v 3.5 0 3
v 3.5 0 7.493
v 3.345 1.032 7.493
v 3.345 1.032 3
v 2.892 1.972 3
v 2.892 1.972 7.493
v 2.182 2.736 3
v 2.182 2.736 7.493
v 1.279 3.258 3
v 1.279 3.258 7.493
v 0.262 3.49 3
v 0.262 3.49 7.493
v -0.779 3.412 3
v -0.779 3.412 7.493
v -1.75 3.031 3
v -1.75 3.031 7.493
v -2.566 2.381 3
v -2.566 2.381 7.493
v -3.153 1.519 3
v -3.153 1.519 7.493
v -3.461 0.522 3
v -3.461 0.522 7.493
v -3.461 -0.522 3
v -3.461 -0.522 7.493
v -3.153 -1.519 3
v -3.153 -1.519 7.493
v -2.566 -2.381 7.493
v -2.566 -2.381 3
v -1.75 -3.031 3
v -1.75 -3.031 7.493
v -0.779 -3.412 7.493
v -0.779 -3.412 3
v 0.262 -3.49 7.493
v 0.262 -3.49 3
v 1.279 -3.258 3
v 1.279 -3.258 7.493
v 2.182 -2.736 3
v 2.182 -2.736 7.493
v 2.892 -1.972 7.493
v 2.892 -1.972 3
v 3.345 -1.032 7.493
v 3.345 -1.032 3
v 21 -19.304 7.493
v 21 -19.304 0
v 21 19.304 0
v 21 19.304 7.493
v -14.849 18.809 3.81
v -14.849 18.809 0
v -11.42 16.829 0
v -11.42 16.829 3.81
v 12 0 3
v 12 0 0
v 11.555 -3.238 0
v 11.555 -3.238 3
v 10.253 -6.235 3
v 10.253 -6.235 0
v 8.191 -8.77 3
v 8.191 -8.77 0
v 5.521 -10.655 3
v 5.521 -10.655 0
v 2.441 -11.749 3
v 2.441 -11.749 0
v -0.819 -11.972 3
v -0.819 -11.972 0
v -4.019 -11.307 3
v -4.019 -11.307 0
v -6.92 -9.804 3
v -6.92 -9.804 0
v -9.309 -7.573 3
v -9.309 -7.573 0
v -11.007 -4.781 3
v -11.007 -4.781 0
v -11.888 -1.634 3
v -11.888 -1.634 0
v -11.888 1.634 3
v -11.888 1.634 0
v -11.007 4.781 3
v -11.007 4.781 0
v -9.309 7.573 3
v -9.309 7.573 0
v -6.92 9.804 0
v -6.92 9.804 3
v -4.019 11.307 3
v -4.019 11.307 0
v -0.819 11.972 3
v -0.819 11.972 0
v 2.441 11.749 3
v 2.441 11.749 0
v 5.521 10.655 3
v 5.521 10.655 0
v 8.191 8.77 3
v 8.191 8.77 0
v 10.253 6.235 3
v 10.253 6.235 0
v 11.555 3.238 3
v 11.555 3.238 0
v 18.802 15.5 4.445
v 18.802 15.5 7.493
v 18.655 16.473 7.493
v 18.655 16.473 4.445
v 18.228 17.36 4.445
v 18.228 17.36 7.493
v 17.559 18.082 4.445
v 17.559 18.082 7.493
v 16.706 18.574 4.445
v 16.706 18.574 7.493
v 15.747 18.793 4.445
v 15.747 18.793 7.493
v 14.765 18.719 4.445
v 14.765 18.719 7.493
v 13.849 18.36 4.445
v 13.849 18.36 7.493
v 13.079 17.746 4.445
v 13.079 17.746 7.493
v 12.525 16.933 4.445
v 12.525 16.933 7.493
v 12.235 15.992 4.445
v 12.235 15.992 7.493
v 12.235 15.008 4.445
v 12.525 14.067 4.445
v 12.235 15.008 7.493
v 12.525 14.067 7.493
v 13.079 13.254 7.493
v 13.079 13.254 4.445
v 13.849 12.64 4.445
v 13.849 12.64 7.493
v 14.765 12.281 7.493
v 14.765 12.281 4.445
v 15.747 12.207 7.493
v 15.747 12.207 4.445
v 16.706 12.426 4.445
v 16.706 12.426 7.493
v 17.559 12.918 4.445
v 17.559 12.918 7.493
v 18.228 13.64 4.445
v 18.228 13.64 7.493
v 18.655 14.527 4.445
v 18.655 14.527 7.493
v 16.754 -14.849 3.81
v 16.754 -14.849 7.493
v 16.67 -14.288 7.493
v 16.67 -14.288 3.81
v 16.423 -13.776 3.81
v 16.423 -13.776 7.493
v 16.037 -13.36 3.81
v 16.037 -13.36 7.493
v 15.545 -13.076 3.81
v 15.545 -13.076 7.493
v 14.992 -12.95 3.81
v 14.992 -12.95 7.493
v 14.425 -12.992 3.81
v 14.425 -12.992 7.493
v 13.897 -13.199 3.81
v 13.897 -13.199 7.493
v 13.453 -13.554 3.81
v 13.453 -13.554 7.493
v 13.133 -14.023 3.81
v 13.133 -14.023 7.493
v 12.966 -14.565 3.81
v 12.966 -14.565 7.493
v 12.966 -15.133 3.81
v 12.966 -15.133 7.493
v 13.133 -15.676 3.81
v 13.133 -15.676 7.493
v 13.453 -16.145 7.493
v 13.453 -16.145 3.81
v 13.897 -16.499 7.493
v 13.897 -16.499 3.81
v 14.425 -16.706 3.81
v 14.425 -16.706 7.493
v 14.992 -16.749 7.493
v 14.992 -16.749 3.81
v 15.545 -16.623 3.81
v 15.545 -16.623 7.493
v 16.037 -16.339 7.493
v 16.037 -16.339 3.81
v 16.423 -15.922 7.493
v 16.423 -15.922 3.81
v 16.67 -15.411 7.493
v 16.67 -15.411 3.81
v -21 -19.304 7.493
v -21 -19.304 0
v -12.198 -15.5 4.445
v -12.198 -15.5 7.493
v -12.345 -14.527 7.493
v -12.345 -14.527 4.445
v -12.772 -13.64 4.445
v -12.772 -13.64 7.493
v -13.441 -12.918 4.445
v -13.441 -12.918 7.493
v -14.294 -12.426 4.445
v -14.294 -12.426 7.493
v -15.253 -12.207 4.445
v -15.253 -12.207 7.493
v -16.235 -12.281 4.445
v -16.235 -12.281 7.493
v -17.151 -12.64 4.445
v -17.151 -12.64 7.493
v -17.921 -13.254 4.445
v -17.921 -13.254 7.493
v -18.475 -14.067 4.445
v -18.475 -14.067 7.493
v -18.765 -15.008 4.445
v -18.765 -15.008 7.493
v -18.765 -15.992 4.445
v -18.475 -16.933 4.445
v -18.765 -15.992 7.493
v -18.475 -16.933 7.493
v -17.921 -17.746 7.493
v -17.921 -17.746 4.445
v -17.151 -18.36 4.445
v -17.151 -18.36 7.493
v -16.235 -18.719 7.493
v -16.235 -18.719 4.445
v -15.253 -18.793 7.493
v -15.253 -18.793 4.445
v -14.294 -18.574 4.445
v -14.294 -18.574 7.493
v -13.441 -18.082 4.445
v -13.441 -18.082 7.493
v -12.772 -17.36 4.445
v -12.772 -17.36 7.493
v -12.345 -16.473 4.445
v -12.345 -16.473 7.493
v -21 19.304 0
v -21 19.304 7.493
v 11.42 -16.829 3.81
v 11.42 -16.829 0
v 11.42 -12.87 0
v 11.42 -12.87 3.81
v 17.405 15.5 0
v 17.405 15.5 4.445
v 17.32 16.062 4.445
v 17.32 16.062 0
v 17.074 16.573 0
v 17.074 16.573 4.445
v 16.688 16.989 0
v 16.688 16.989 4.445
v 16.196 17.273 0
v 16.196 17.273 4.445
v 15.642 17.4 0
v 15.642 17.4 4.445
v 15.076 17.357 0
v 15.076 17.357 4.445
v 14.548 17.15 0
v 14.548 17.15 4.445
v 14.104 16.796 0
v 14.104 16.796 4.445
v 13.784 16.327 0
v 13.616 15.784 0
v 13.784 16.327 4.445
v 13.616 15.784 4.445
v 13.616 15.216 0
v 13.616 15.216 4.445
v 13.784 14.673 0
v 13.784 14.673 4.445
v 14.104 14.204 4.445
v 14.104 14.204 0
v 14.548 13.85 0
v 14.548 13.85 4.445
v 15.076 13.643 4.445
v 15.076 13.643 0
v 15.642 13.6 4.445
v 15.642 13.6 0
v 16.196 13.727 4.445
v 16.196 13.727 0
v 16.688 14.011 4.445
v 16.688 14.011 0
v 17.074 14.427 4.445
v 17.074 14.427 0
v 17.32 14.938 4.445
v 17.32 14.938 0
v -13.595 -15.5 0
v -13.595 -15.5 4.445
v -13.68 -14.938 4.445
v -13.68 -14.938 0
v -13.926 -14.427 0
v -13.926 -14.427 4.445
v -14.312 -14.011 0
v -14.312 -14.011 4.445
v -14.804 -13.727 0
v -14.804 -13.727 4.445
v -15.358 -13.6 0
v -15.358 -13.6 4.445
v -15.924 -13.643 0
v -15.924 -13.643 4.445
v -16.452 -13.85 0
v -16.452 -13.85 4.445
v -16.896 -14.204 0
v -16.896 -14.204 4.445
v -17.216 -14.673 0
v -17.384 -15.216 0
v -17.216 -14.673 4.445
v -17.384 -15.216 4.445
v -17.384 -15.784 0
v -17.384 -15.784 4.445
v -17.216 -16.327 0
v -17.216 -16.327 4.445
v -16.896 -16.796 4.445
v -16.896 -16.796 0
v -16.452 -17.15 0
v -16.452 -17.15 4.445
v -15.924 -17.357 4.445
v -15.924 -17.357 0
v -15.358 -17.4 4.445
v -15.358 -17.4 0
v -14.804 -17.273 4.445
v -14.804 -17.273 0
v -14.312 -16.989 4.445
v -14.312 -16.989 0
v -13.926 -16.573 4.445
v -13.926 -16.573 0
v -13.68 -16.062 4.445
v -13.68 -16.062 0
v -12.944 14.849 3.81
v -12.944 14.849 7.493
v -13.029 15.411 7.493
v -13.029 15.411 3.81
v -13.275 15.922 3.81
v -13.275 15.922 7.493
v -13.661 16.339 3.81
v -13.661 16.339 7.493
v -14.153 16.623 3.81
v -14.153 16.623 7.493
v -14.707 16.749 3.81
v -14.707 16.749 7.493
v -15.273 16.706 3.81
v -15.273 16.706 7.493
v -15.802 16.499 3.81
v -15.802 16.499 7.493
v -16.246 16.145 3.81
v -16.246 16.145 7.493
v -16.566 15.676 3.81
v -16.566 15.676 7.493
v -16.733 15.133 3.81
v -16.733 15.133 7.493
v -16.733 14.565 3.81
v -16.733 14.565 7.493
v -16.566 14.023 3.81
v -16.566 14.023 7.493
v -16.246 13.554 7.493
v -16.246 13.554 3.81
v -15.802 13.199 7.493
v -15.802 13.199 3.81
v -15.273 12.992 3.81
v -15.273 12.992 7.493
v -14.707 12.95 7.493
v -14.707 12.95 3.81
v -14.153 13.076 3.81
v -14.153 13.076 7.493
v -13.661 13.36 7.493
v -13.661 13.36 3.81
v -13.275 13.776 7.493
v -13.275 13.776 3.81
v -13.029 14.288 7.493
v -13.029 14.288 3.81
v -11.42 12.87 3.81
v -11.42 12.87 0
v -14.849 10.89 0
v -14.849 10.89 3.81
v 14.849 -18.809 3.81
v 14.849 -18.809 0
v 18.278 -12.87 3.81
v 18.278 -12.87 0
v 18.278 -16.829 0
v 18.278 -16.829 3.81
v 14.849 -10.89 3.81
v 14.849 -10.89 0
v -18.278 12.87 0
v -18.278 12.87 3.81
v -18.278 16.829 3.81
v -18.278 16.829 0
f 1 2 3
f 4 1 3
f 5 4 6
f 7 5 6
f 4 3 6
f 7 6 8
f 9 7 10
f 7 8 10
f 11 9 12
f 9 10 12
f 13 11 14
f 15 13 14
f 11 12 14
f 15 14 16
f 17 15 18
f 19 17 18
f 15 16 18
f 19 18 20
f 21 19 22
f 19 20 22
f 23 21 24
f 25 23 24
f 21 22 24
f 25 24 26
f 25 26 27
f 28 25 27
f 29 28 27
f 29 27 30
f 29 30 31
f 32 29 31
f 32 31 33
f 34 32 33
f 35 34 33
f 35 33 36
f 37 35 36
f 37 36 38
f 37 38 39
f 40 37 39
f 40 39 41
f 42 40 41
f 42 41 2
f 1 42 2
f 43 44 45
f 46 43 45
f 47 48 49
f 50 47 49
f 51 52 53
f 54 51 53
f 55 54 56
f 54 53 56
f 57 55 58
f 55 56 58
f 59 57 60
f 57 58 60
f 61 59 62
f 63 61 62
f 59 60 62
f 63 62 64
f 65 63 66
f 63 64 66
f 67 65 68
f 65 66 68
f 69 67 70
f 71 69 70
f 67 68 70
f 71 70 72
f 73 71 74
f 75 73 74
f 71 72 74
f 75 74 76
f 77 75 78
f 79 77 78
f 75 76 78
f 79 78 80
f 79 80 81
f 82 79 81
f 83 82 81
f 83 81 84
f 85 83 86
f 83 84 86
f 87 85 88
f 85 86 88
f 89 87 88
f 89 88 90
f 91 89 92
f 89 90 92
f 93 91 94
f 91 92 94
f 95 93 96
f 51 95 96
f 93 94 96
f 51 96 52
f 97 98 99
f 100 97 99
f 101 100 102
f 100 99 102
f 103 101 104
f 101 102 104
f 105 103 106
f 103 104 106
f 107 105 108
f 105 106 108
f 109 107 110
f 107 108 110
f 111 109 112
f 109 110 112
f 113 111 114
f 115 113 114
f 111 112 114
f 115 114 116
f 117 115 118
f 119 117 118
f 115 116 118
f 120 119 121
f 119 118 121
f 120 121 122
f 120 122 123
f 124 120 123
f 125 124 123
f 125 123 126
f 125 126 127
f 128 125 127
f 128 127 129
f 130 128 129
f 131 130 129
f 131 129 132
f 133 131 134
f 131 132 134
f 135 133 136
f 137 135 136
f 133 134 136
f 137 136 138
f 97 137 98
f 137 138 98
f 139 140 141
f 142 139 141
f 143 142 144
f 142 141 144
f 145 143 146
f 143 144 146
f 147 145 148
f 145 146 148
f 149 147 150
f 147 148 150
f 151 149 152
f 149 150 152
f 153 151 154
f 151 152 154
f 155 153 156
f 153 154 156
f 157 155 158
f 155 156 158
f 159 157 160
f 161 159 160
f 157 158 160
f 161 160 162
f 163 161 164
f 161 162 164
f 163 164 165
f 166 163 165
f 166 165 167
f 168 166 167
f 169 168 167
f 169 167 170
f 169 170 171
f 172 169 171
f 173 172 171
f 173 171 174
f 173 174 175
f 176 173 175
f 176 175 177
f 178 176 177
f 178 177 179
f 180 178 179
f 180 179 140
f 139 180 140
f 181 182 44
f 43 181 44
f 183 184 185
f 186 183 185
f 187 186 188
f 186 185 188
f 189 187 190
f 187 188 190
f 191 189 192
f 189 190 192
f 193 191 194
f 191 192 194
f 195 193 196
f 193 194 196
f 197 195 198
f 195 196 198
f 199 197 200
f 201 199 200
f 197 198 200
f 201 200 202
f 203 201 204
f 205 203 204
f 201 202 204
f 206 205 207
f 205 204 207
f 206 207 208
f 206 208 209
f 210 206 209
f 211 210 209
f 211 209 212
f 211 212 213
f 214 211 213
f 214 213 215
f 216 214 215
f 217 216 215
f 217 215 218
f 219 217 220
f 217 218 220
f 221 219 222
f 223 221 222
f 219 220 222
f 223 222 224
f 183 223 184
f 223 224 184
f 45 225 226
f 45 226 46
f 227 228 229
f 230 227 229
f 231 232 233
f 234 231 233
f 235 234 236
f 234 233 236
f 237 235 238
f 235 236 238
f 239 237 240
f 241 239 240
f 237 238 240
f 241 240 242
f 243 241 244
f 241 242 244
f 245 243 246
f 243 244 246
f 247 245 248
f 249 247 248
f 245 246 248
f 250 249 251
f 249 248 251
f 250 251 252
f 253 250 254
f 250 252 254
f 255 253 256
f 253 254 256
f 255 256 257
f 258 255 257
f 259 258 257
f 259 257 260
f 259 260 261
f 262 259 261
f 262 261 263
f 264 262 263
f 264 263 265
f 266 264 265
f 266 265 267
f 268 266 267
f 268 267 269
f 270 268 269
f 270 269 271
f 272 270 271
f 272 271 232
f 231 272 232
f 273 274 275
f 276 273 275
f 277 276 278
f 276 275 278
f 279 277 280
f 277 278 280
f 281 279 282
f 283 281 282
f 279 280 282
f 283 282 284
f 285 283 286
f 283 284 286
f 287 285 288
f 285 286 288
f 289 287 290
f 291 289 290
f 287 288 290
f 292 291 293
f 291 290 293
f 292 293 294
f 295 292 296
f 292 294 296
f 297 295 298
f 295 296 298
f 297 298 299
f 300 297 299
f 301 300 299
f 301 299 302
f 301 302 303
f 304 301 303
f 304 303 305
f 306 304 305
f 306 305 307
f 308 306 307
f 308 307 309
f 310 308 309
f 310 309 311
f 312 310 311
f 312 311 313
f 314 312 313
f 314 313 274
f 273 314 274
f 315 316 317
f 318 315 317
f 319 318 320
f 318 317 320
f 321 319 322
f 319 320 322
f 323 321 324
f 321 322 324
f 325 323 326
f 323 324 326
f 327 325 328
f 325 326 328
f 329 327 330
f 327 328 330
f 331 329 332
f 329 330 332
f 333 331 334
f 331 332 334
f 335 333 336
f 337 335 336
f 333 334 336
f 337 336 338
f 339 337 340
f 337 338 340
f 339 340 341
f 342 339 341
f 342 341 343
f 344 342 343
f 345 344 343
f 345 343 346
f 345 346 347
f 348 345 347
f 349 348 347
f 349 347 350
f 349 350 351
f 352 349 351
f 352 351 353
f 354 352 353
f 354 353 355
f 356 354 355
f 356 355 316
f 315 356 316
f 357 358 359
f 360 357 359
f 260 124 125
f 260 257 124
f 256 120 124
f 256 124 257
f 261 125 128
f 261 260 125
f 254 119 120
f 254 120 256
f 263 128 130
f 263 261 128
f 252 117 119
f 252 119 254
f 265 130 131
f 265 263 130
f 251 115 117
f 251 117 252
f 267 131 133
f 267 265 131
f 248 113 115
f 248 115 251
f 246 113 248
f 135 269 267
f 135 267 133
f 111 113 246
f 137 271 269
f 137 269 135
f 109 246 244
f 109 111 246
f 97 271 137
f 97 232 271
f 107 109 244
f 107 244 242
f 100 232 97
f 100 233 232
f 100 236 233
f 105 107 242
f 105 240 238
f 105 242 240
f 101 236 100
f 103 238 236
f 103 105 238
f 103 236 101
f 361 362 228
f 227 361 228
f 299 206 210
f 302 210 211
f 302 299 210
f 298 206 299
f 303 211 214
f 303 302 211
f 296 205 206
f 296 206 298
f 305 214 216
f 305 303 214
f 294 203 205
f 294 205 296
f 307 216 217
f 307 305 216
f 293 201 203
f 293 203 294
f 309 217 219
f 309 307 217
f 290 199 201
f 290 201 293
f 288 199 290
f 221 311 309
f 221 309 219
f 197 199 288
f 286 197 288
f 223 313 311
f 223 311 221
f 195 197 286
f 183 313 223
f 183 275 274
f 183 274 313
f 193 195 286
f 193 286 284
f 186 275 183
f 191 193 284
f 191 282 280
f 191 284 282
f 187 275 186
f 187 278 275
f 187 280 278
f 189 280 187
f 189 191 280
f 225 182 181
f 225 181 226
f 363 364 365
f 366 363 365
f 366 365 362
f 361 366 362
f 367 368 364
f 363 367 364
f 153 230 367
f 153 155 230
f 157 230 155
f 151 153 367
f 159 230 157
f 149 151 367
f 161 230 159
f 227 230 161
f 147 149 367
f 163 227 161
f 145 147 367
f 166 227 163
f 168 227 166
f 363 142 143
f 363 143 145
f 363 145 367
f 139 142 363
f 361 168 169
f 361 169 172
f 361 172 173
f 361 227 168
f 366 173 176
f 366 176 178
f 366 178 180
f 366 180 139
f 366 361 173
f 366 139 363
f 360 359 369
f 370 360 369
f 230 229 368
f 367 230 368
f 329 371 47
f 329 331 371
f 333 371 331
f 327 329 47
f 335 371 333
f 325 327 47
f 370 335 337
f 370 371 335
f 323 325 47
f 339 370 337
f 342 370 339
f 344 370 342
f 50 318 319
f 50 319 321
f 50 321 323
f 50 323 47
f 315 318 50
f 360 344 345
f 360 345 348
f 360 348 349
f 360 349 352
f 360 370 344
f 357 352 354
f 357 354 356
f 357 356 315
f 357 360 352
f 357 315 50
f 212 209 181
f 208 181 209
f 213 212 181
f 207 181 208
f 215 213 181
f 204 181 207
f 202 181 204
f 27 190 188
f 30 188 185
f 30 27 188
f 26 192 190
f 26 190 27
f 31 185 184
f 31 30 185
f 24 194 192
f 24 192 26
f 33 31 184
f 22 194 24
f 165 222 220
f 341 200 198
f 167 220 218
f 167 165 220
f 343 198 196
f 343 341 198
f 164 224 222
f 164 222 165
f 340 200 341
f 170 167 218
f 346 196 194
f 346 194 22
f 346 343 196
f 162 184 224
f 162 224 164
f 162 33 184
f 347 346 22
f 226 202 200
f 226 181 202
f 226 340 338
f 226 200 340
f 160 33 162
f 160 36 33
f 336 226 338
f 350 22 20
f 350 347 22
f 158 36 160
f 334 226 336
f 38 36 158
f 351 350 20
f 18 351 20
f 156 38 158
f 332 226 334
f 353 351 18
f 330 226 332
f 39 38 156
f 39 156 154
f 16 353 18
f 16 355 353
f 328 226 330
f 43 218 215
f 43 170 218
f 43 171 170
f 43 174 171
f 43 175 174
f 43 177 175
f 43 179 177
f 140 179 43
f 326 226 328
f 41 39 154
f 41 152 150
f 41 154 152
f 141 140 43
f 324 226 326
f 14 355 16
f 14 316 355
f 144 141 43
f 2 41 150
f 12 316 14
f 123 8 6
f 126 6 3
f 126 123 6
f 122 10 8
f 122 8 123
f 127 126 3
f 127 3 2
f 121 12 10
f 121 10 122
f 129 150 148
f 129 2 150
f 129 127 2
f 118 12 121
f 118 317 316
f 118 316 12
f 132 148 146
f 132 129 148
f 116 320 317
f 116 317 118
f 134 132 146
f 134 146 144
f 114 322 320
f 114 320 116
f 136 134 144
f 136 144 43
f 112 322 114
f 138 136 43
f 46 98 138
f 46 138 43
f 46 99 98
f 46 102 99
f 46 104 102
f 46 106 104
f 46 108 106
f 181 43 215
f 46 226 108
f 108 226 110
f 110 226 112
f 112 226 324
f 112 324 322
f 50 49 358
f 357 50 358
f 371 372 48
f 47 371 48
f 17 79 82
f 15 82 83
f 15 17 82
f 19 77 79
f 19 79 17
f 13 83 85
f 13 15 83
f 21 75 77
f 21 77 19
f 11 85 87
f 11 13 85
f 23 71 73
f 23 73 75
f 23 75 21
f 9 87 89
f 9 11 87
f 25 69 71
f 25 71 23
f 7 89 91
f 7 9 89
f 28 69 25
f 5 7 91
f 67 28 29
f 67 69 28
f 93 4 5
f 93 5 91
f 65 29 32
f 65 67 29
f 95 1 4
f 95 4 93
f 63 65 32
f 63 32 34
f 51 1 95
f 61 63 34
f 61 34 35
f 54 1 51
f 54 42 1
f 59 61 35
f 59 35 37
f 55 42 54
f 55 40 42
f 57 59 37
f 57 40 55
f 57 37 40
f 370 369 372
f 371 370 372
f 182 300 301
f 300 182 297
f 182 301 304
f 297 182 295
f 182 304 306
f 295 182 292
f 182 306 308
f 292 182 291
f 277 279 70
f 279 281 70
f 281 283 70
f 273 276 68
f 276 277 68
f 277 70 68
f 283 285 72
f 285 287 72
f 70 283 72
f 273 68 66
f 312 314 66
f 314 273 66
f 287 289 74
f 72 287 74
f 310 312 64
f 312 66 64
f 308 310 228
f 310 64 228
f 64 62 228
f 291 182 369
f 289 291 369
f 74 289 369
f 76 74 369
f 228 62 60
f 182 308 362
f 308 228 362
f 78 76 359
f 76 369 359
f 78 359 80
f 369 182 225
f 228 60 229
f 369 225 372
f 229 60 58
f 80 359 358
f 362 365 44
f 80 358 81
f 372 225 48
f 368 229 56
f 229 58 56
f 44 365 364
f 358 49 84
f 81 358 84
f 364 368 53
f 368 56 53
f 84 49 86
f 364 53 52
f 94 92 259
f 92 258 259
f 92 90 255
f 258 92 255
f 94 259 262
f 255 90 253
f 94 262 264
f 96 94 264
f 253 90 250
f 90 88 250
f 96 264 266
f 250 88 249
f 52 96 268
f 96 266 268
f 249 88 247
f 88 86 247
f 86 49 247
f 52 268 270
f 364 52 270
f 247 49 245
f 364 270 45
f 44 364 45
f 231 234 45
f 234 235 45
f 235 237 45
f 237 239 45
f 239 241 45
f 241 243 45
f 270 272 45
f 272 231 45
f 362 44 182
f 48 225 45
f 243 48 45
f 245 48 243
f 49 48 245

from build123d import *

# Parameters (mm, degrees)
F0_W      = 42
F0_H      = 38.608
F1_DEPTH  = 7.493
F2_R      = 1.905
F3_DEPTH  = 7.494
F4_R      = 1.905
F5_DEPTH  = 25.4
F6_R      = 3.302
F6_R_2    = 1.905
F7_DEPTH  = 3.048
F8_R      = 3.5
F9_DEPTH  = 7.494
F10_R     = 12
F11_DEPTH = 3
F13_DEPTH = 3.81


with BuildPart() as f1:
    # F0 (on Top) → F1 (new body)
    with BuildSketch(Plane.XY):
        Rectangle(F0_W, F0_H)
    extrude(amount=F1_DEPTH)

    # F2 (on face) → F3 (cut, through all)
    with BuildSketch(Plane.XY.offset(7.493)):
        with Locations((-14.8492424049, 14.8492424049)):
            Circle(F2_R)
        with Locations((14.8492424049, -14.8492424049)):
            Circle(F2_R)
    extrude(amount=-F3_DEPTH, mode=Mode.SUBTRACT)

    # F4 (on face) → F5 (cut)
    with BuildSketch(Plane.XY.offset(7.493)):
        with Locations((15.5, 15.5)):
            Circle(F4_R)
        with Locations((-15.5, -15.5)):
            Circle(F4_R)
    extrude(amount=-F5_DEPTH, mode=Mode.SUBTRACT)

    # F6 (on face) → F7 (cut)
    with BuildSketch(Plane.XY.offset(7.493)):
        with Locations((15.5, 15.5)):
            Circle(F6_R)
        with Locations((15.5, 15.5)):
            Circle(F6_R_2, mode=Mode.SUBTRACT)
        with Locations((-15.5, -15.5)):
            Circle(F6_R)
        with Locations((-15.5, -15.5)):
            Circle(F6_R_2, mode=Mode.SUBTRACT)
        with Locations((15.5, 15.5)):
            Circle(F6_R_2)
        with Locations((-15.5, -15.5)):
            Circle(F6_R_2)
    extrude(amount=-F7_DEPTH, mode=Mode.SUBTRACT)

    # F8 (on face) → F9 (cut, through all)
    with BuildSketch(Plane.XY.offset(7.493)):
        Circle(F8_R)
    extrude(amount=-F9_DEPTH, mode=Mode.SUBTRACT)

    # F10 (on face) → F11 (cut)
    with BuildSketch(Plane(origin=(0, 0, 0), x_dir=(1, 0, 0), z_dir=(0, 0, -1))):
        Circle(F10_R)
    extrude(amount=-F11_DEPTH, mode=Mode.SUBTRACT)

    # F12 (on face) → F13 (cut)
    with BuildSketch(Plane(origin=(0, 0, 0), x_dir=(1, 0, 0), z_dir=(0, 0, -1))):
        Polygon((18.2782424049, 12.8695083319), (18.2782424049, 16.828976478), (14.8492424049, 18.808710551), (11.4202424049, 16.828976478), (11.4202424049, 12.8695083319), (14.8492424049, 10.8897742588), align=None)
        Polygon((-11.4202424049, -16.828976478), (-11.4202424049, -12.8695083319), (-14.8492424049, -10.8897742588), (-18.2782424049, -12.8695083319), (-18.2782424049, -16.828976478), (-14.8492424049, -18.808710551), align=None)
    extrude(amount=-F13_DEPTH, mode=Mode.SUBTRACT)


solid = f1.part
